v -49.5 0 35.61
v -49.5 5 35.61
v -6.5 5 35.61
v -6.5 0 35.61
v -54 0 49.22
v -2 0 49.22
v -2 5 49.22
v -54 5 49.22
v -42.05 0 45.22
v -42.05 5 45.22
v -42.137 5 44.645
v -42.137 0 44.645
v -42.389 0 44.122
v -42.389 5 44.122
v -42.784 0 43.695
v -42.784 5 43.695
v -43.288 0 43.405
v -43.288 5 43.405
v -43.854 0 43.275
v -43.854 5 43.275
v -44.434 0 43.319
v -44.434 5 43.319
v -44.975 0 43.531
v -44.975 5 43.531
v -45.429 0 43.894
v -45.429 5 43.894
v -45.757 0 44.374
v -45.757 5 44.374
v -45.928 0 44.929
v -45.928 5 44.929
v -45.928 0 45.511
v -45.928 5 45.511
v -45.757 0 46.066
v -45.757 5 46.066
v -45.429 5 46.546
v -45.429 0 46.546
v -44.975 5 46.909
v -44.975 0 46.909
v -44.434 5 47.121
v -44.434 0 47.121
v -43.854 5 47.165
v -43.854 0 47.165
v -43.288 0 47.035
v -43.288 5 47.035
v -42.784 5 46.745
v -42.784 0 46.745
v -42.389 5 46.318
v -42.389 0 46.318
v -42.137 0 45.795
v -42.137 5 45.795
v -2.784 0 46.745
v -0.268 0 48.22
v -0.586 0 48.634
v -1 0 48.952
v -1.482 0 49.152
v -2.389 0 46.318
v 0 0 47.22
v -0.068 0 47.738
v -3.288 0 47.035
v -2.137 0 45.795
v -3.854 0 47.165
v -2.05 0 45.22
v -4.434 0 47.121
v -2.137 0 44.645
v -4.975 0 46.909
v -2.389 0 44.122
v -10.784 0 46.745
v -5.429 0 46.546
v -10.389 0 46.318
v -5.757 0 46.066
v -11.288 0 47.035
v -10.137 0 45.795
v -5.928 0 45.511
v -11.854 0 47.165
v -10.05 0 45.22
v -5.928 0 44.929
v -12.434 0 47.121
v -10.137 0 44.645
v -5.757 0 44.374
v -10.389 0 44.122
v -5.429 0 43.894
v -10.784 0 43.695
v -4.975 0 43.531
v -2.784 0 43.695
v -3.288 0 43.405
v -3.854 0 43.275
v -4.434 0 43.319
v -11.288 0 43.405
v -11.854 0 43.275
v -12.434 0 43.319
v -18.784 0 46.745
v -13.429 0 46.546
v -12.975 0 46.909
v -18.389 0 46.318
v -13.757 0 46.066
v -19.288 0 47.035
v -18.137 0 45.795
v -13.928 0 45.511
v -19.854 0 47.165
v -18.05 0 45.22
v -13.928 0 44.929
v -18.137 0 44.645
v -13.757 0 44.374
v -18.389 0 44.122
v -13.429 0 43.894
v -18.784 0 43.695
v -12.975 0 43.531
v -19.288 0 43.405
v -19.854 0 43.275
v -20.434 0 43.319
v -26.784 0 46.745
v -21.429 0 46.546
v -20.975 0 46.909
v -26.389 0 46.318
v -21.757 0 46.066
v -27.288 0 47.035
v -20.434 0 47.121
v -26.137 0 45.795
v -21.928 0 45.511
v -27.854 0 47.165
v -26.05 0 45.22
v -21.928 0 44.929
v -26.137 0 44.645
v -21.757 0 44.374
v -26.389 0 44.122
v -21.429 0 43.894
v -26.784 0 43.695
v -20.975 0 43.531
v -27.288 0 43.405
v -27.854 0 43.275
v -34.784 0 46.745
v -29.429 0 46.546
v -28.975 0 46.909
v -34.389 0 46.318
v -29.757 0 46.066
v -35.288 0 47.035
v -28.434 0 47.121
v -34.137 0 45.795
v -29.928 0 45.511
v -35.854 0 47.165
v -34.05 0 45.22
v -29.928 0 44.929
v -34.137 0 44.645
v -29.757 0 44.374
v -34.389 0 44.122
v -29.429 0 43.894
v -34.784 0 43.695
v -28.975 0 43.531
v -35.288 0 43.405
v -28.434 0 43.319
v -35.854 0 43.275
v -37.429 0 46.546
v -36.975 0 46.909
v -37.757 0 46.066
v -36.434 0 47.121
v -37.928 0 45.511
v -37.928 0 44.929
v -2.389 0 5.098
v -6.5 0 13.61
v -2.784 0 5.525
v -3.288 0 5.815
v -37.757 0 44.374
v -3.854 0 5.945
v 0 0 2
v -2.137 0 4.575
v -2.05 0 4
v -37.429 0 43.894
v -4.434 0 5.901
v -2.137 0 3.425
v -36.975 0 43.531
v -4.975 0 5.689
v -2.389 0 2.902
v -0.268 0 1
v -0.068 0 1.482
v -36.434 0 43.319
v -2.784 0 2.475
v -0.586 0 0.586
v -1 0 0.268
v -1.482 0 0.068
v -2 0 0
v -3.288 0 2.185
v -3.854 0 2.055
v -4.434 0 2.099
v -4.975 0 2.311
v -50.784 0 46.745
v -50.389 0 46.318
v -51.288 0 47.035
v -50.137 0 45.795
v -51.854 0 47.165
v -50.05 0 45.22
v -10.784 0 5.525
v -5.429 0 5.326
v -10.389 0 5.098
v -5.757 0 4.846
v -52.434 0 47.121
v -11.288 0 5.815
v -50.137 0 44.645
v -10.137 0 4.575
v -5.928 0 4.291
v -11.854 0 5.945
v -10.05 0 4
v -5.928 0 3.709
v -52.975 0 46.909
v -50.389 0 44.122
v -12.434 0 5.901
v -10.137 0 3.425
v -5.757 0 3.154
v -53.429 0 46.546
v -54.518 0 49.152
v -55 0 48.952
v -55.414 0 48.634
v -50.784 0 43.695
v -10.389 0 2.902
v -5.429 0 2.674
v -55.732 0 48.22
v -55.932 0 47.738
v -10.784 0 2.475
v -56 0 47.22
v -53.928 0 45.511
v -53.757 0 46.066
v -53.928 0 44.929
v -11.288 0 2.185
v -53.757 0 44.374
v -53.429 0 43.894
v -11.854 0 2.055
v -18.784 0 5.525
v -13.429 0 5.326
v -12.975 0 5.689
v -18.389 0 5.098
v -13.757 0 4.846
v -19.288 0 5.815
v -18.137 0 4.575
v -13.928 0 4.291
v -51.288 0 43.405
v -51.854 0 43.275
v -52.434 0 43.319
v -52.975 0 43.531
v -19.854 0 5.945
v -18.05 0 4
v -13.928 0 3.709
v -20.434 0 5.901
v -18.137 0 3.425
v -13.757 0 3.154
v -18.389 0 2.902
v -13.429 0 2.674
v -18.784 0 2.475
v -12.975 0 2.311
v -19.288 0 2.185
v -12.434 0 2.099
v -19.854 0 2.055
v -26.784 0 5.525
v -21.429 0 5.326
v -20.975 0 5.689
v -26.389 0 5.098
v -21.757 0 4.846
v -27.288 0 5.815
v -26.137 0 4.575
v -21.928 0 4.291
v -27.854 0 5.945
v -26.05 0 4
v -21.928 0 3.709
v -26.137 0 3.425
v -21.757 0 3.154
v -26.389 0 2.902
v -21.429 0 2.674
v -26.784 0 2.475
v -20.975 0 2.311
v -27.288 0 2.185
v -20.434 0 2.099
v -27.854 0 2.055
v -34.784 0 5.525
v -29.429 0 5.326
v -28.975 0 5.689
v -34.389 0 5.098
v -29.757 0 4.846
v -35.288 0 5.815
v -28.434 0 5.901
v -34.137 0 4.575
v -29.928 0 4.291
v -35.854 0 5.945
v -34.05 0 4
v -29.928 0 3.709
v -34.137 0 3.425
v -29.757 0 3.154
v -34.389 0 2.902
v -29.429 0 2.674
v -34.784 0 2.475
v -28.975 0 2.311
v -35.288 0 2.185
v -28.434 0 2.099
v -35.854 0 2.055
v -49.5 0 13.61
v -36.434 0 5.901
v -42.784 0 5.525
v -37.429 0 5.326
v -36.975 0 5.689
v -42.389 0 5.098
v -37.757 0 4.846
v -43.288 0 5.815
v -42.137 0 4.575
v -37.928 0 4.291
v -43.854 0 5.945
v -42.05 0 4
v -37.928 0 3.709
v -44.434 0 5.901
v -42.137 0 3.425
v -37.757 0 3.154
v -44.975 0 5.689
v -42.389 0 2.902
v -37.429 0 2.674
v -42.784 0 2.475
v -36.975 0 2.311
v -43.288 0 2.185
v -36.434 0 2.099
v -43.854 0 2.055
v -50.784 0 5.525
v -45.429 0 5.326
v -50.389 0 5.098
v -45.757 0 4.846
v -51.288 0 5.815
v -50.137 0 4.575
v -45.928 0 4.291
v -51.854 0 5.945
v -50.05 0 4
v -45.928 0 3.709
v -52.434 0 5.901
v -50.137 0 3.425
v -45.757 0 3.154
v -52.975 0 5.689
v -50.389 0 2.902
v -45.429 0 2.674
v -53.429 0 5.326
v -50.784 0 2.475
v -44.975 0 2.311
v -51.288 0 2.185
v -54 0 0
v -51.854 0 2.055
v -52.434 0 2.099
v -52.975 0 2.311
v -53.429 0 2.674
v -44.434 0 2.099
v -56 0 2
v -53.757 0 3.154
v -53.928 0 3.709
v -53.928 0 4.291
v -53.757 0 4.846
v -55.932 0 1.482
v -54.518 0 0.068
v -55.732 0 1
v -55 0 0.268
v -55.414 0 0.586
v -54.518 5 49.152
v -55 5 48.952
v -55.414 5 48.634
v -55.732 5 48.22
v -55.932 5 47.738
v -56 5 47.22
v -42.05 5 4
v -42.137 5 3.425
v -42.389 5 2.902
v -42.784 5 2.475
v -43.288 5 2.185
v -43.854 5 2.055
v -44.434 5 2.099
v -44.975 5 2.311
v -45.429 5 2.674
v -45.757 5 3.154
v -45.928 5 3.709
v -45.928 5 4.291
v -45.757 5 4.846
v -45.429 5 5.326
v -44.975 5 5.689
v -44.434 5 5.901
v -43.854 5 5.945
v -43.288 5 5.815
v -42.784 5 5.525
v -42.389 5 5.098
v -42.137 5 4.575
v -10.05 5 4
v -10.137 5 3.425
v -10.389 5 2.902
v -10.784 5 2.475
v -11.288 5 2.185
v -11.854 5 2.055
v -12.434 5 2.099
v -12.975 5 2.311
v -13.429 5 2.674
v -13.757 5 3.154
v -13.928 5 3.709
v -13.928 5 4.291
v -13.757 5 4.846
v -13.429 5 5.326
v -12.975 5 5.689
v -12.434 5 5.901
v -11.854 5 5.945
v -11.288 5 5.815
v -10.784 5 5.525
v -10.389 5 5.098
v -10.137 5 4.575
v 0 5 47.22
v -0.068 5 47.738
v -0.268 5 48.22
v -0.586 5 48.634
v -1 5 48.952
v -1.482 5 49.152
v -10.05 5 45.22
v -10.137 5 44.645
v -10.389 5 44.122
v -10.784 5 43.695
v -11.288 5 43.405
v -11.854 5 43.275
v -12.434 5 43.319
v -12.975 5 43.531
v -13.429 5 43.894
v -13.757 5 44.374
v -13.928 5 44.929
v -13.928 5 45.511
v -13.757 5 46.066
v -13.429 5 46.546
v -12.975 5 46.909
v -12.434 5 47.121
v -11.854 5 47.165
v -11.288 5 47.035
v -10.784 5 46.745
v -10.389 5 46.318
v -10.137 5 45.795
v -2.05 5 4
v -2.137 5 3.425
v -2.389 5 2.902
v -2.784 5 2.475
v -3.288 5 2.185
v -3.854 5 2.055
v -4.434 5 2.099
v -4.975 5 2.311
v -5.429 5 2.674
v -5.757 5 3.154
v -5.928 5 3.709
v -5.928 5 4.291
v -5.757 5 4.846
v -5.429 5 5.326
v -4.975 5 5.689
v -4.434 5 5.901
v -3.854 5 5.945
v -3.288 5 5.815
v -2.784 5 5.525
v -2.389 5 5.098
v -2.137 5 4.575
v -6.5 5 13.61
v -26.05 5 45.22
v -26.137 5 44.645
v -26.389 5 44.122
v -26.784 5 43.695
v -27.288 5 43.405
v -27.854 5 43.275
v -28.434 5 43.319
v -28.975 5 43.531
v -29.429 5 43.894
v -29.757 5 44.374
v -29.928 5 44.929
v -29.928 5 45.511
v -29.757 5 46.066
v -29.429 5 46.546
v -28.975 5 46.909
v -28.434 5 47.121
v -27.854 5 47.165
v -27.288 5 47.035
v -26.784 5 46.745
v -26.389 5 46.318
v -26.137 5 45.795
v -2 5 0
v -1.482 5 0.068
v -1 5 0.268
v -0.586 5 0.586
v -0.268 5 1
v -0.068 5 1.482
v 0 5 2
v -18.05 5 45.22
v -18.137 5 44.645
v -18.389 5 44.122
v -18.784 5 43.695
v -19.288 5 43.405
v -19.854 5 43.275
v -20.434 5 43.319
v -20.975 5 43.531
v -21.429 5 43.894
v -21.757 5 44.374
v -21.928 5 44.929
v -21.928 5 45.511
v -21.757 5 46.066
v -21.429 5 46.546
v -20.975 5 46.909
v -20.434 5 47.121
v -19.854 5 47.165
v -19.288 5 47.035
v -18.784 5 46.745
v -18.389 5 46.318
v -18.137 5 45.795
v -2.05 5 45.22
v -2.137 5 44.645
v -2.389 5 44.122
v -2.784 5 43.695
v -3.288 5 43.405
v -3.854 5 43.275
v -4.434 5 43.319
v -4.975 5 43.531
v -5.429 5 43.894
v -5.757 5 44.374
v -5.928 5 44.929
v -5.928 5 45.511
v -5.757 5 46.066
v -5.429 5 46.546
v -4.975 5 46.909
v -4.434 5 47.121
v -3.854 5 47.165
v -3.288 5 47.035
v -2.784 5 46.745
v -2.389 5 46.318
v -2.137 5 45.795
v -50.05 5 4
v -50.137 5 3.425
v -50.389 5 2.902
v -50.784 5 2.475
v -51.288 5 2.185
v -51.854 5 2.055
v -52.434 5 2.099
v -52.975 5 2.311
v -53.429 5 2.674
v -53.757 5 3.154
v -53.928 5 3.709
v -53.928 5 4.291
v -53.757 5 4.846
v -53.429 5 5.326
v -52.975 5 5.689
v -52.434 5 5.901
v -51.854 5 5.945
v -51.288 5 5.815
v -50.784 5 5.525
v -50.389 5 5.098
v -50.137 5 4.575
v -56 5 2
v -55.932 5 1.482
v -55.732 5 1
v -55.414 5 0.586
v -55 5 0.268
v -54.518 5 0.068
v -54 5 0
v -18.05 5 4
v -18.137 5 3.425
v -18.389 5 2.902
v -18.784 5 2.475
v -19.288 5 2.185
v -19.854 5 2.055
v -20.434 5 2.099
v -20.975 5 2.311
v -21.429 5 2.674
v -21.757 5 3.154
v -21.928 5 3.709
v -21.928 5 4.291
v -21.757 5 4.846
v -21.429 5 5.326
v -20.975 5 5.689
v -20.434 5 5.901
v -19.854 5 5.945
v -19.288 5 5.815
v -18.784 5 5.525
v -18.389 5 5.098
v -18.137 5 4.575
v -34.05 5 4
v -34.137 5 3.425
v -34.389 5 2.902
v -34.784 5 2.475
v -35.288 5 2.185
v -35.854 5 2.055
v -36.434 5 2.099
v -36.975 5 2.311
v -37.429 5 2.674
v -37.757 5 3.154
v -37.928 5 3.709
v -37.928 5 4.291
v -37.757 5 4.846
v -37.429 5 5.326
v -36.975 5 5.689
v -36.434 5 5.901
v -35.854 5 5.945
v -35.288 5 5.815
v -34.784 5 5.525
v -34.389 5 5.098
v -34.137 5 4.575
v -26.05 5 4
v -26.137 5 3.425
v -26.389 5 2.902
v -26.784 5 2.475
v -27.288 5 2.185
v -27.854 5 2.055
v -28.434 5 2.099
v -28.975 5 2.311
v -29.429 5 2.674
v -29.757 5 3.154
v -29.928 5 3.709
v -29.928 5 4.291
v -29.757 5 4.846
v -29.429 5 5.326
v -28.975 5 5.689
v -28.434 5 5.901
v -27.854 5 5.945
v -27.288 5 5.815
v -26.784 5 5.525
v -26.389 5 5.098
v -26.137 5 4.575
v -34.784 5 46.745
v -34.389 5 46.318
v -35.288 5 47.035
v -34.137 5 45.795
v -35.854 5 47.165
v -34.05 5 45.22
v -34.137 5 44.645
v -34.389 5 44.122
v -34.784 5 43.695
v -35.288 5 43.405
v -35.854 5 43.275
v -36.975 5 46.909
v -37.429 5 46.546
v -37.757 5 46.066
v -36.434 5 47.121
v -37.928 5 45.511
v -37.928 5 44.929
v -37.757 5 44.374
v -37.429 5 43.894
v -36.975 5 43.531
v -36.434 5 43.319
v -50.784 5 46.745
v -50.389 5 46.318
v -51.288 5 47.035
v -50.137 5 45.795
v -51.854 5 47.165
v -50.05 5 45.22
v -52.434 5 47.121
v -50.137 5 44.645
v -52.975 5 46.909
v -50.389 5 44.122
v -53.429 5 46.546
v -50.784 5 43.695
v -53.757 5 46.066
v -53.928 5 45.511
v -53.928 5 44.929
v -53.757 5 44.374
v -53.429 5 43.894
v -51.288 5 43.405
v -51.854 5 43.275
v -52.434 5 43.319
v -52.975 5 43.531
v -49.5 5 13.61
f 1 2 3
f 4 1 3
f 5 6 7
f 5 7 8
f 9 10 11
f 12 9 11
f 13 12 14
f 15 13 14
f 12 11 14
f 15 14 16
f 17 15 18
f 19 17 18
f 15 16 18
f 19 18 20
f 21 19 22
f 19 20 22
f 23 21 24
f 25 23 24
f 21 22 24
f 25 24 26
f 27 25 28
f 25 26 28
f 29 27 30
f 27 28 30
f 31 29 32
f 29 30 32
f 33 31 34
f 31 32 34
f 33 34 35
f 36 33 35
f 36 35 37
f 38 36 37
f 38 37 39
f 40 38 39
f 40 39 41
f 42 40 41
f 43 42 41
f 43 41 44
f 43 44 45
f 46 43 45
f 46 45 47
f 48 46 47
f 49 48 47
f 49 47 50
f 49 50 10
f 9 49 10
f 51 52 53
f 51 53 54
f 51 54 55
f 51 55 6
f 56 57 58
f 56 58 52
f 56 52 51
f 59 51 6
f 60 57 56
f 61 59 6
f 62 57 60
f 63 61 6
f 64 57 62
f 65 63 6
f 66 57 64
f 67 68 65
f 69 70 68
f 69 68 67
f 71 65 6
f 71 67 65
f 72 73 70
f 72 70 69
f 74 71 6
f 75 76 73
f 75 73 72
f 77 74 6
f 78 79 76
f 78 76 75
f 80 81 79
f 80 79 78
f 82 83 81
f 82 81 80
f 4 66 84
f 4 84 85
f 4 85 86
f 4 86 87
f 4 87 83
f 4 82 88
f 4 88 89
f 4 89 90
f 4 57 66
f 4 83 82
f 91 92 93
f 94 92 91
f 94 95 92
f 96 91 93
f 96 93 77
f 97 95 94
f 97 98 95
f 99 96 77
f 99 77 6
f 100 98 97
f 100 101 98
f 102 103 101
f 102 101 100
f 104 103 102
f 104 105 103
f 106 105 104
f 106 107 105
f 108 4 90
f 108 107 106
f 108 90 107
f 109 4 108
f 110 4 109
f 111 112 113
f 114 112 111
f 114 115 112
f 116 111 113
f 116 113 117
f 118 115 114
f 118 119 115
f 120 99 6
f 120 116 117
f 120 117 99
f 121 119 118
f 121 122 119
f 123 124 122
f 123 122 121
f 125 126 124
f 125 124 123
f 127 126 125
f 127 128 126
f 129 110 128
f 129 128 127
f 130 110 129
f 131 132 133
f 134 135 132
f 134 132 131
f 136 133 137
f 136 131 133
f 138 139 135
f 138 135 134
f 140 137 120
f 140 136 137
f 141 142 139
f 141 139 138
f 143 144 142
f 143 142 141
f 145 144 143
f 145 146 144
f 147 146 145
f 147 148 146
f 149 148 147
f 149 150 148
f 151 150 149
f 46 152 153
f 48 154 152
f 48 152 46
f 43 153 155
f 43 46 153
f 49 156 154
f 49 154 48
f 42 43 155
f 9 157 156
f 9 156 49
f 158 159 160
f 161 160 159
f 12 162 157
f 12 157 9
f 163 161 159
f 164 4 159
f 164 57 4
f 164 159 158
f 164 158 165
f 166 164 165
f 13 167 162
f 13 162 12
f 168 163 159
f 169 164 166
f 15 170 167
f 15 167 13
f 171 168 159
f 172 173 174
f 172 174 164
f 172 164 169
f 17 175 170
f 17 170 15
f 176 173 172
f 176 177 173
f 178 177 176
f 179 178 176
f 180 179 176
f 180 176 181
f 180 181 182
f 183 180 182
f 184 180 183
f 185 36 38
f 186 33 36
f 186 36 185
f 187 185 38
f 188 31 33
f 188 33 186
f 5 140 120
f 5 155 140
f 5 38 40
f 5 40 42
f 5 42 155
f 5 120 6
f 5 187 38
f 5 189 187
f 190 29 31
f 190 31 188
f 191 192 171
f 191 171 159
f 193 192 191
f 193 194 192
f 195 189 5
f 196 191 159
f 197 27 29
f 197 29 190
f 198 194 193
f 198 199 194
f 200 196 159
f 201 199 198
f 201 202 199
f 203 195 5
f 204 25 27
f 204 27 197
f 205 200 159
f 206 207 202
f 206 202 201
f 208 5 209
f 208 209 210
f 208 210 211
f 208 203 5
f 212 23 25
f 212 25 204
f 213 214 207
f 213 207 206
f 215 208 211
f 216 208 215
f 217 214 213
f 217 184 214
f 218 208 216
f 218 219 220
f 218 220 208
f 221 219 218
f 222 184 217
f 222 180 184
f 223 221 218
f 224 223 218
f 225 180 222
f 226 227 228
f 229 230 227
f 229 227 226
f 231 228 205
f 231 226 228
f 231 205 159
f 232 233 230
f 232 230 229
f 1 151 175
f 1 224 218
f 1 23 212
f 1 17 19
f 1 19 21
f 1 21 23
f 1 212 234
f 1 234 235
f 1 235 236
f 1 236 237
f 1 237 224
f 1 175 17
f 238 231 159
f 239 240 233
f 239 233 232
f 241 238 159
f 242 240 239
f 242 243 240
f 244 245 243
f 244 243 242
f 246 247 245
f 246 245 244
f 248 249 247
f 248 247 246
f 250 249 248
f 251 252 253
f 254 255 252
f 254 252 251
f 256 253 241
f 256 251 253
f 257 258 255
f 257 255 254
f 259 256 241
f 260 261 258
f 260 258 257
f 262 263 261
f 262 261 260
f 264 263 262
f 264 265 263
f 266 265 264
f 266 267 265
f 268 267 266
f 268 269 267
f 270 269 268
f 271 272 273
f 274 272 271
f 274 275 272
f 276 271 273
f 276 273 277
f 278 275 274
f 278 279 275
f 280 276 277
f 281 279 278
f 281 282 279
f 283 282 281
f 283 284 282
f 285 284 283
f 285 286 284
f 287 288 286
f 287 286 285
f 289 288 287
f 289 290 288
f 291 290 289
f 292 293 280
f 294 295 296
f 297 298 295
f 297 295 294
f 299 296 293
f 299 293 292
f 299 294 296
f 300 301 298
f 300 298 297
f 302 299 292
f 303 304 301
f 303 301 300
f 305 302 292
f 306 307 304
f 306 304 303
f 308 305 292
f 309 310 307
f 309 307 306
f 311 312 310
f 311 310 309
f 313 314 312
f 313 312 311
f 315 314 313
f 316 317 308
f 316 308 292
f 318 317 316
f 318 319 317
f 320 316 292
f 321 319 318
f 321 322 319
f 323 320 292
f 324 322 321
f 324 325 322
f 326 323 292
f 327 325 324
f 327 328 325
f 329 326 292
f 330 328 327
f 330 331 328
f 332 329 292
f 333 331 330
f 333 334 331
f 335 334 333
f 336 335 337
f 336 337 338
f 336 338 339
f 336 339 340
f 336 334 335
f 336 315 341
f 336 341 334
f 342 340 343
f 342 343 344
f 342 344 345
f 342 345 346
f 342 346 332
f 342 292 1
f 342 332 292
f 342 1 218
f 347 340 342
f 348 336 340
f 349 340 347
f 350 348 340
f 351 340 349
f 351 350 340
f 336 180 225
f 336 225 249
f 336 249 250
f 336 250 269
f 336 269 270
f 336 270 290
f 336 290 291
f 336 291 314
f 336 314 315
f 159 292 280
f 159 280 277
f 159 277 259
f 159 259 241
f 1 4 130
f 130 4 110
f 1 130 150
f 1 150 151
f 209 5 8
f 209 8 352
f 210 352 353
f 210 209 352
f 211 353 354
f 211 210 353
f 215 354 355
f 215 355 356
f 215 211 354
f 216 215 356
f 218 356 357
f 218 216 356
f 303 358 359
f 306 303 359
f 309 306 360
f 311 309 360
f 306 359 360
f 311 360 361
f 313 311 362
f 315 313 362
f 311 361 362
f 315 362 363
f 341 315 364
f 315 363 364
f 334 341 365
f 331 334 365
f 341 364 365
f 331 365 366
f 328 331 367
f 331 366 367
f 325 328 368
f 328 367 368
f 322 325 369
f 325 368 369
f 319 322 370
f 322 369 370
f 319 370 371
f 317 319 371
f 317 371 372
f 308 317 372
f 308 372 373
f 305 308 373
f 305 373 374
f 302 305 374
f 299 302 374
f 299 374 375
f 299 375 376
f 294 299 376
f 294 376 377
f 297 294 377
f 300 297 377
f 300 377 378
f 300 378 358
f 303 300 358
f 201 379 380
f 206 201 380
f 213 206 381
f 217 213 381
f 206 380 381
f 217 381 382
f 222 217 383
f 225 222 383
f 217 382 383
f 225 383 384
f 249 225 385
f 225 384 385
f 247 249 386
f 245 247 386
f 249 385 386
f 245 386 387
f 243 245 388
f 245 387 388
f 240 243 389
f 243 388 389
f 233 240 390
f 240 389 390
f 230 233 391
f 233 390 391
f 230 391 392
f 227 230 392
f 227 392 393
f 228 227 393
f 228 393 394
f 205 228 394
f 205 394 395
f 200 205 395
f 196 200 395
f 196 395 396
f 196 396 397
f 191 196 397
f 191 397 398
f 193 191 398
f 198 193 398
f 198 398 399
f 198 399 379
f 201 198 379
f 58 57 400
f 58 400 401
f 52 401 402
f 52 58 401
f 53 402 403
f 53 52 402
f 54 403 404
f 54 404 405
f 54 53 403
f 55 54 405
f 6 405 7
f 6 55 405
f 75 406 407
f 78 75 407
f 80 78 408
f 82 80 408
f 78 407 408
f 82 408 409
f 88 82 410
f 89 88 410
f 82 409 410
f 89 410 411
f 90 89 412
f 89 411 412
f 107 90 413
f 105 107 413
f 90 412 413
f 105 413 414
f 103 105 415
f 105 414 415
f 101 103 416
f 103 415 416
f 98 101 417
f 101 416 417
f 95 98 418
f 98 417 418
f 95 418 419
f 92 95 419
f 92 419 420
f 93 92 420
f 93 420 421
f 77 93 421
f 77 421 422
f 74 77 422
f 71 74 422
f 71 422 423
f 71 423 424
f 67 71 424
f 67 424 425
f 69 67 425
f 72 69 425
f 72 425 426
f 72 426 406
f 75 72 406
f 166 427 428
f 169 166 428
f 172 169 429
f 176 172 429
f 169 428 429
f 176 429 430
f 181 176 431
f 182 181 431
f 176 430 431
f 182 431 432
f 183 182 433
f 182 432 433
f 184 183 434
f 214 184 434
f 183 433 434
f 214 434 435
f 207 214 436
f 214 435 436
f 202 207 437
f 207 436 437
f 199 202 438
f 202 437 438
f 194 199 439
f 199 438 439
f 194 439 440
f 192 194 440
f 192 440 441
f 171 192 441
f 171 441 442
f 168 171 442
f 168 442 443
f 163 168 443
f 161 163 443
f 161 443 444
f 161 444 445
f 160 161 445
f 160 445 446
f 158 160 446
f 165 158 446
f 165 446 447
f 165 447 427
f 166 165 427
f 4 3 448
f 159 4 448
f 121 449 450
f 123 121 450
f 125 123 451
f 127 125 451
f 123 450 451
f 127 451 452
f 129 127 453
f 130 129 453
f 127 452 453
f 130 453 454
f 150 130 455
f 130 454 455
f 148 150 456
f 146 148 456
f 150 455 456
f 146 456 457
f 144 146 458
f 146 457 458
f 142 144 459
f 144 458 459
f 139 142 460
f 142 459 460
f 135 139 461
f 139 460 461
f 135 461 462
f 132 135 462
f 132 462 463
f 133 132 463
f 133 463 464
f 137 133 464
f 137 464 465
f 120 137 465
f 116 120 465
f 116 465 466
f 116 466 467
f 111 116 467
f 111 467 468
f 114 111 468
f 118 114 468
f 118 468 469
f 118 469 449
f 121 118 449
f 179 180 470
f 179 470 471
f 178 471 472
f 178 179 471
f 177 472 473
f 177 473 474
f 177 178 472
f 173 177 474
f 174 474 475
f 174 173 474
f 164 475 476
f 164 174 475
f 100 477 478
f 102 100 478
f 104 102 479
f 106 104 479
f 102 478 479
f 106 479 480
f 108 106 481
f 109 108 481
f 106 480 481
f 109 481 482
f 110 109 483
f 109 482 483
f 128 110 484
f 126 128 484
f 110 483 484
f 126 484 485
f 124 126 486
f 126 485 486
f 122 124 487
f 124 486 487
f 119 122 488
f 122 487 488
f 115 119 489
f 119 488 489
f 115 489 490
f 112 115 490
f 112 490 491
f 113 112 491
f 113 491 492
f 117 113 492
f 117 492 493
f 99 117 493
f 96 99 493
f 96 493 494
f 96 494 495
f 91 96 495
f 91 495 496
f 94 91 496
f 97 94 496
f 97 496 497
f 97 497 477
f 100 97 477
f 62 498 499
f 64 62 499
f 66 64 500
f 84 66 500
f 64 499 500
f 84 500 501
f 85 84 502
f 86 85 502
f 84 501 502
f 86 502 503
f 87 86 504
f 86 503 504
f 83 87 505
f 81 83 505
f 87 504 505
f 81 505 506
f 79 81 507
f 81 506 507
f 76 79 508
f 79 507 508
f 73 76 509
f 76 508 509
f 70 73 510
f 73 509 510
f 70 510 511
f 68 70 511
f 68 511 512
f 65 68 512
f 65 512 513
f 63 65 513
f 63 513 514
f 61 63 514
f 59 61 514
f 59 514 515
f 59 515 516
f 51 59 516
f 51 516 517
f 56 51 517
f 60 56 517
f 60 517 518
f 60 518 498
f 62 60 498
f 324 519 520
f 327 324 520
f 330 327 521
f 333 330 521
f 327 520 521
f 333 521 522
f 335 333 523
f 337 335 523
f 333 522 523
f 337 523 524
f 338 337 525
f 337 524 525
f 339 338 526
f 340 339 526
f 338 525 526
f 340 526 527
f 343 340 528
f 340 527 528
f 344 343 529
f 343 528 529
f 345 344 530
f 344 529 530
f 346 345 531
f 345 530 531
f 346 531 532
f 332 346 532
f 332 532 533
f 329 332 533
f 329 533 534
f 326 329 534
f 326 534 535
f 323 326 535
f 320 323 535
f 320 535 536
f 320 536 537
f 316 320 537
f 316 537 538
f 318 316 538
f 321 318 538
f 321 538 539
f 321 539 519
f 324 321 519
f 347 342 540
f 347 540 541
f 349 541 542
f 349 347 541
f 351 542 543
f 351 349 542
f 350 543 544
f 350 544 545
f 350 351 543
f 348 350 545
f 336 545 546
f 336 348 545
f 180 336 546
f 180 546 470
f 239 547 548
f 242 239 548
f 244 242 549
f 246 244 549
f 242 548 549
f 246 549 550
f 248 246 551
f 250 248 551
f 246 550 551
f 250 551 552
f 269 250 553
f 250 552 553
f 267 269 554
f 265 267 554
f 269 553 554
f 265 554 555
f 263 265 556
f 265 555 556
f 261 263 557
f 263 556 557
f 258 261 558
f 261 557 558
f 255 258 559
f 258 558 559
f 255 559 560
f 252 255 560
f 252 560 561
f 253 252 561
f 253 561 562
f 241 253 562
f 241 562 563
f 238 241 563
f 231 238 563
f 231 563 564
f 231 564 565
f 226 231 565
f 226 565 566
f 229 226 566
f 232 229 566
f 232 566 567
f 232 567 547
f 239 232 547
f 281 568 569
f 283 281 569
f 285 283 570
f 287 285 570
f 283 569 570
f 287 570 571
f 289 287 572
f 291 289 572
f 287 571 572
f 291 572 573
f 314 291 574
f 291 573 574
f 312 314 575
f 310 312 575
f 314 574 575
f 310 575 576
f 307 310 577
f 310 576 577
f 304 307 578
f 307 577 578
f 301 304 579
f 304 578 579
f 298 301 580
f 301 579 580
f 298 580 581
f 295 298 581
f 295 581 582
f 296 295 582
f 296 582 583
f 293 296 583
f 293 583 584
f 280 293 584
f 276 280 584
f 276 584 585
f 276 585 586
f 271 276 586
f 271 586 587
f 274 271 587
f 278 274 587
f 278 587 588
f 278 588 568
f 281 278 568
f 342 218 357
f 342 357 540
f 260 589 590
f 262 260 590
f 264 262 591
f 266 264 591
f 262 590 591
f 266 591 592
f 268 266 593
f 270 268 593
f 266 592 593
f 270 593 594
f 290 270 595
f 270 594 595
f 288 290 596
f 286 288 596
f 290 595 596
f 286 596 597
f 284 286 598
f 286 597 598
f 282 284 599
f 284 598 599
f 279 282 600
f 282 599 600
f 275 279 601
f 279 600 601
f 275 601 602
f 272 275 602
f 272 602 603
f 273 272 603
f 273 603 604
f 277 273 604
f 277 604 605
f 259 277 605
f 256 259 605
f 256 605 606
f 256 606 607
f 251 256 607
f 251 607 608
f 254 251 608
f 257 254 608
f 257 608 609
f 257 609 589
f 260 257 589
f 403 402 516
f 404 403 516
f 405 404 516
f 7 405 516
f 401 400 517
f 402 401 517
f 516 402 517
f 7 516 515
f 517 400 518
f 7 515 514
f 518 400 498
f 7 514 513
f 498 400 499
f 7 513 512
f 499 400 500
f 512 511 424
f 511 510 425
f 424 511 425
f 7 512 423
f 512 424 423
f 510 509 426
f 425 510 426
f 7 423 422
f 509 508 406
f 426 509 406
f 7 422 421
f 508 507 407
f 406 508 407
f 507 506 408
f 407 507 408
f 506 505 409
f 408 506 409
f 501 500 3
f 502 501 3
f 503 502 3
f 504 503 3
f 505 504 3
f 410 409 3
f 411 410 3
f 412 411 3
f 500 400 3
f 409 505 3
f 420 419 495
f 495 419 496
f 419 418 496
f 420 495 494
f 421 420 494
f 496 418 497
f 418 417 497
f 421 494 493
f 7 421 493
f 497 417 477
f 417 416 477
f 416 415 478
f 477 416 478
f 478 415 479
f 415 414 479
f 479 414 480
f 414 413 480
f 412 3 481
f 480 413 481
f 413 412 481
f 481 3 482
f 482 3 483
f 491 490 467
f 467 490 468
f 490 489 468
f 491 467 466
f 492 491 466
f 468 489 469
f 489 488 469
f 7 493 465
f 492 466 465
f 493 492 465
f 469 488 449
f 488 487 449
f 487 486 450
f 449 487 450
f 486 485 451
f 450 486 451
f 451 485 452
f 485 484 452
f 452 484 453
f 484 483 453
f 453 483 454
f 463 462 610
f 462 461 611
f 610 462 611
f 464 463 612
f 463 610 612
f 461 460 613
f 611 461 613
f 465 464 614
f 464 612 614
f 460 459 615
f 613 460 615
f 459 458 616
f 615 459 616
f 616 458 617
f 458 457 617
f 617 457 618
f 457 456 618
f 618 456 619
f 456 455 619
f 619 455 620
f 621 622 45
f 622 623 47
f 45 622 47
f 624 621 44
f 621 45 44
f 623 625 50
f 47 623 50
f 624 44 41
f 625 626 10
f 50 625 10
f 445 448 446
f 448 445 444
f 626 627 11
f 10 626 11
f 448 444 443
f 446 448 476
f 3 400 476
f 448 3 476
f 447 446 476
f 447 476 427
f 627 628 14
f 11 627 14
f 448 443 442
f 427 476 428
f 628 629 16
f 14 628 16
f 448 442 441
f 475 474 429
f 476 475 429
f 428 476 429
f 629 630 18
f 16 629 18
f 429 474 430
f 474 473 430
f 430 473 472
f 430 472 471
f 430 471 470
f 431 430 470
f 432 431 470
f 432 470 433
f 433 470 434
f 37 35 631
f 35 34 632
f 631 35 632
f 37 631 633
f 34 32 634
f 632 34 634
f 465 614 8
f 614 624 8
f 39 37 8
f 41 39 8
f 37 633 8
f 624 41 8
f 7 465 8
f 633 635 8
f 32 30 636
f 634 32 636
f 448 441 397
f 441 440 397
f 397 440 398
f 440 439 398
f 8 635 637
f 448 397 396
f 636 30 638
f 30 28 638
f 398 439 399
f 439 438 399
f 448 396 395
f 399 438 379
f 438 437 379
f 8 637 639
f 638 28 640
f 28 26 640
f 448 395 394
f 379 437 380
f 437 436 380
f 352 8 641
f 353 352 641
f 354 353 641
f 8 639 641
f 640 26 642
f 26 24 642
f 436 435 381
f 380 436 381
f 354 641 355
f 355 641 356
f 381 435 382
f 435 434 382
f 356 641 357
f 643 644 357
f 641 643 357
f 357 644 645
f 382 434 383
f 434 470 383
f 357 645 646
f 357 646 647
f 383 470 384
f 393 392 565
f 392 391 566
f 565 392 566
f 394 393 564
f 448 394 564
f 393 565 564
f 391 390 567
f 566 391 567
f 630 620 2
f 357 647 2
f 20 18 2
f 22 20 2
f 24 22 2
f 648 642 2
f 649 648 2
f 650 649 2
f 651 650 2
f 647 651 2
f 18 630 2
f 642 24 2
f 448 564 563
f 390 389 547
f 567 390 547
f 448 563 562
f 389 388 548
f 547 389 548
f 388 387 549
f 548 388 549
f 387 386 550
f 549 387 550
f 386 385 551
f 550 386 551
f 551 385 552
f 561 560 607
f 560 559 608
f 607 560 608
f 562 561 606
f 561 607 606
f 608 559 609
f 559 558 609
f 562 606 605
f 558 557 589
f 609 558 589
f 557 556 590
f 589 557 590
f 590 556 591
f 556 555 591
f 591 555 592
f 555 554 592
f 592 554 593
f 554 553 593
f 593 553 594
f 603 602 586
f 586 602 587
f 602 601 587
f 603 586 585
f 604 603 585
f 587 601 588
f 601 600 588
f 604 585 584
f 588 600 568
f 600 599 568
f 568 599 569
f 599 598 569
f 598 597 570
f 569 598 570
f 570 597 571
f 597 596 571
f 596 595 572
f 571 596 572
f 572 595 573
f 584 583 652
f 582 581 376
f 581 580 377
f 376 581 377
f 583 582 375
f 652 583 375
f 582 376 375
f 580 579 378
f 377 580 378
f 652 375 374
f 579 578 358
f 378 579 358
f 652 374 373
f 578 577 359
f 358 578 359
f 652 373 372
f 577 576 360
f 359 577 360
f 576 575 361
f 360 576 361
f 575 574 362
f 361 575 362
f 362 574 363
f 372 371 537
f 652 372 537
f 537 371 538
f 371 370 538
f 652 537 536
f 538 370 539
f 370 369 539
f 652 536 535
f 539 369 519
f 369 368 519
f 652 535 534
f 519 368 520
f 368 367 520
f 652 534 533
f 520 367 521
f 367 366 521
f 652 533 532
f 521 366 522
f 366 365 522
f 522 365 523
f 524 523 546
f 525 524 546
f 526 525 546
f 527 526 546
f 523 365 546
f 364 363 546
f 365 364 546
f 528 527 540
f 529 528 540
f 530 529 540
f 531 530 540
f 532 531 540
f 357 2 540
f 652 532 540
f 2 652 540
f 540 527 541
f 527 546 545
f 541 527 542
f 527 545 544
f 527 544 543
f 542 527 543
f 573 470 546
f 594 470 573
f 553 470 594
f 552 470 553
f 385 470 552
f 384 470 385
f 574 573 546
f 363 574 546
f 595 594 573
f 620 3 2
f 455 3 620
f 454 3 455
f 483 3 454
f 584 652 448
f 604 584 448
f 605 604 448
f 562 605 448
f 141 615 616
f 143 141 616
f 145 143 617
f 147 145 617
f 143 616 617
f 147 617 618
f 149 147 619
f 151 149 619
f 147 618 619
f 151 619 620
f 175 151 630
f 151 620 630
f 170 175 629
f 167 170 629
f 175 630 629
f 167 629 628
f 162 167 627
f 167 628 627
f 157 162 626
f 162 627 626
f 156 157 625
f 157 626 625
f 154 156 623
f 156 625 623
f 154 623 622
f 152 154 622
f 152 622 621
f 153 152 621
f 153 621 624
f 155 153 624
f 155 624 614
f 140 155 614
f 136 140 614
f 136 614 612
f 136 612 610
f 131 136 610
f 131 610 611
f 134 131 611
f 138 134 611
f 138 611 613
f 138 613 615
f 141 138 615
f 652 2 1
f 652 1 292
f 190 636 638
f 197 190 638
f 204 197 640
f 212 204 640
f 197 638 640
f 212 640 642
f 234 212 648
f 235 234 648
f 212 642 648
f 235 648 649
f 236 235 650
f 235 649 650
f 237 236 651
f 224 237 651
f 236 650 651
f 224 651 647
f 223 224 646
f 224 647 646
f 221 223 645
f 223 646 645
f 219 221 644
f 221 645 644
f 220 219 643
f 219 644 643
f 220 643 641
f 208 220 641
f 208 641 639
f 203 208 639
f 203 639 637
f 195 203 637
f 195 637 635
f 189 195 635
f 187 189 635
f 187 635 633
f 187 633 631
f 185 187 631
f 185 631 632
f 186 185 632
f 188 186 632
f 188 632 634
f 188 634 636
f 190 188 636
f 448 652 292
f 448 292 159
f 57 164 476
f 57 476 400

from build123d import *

# Parameters (mm, degrees)
BOSS_EXTRUDE1_DEPTH = 5
SKETCH2_R           = 1.95
SKETCH2_W           = 43
SKETCH2_H           = 22
CUT_EXTRUDE1_DEPTH  = 6


with BuildPart() as part:
    # Sketch1 → Boss-Extrude1 (new body)
    with BuildSketch(Plane(origin=(0, 0, 0), x_dir=(1, 0, 0), z_dir=(0, 1, 0))):
        with BuildLine():
            Line((-54, 0), (-2, 0))
            ThreePointArc((-2, 0), (-0.585786438, -0.585786438), (0, -2))
            Line((0, -2), (0, -47.22))
            ThreePointArc((0, -47.22), (-0.585786438, -48.634213562), (-2, -49.22))
            Line((-2, -49.22), (-54, -49.22))
            ThreePointArc((-54, -49.22), (-55.414213562, -48.634213562), (-56, -47.22))
            Line((-56, -47.22), (-56, -2))
            ThreePointArc((-56, -2), (-55.414213562, -0.585786438), (-54, 0))
        make_face()
    extrude(amount=BOSS_EXTRUDE1_DEPTH)

    # Sketch2 → Cut-Extrude1 (cut, through all)
    with BuildSketch(Plane(origin=(0, 5, 0), x_dir=(1, 0, 0), z_dir=(0, 1, 0))):
        with Locations((-4, -4)):
            Circle(SKETCH2_R)
        with Locations((-12, -4)):
            Circle(SKETCH2_R)
        with Locations((18, -4)):
            Circle(SKETCH2_R)
        with Locations((-68, -4)):
            Circle(SKETCH2_R)
        with Locations((-60, -4)):
            Circle(SKETCH2_R)
        with Locations((-52, -4)):
            Circle(SKETCH2_R)
        with Locations((-44, -4)):
            Circle(SKETCH2_R)
        with Locations((-36, -4)):
            Circle(SKETCH2_R)
        with Locations((-28, -4)):
            Circle(SKETCH2_R)
        with Locations((-20, -4)):
            Circle(SKETCH2_R)
        with Locations((-4, -45.22)):
            Circle(SKETCH2_R)
        with Locations((-12, -45.22)):
            Circle(SKETCH2_R)
        with Locations((18, -45.22)):
            Circle(SKETCH2_R)
        with Locations((-68, -45.22)):
            Circle(SKETCH2_R)
        with Locations((-60, -45.22)):
            Circle(SKETCH2_R)
        with Locations((-52, -45.22)):
            Circle(SKETCH2_R)
        with Locations((-44, -45.22)):
            Circle(SKETCH2_R)
        with Locations((-36, -45.22)):
            Circle(SKETCH2_R)
        with Locations((-28, -45.22)):
            Circle(SKETCH2_R)
        with Locations((-20, -45.22)):
            Circle(SKETCH2_R)
        with Locations((-28, -24.61)):
            Rectangle(SKETCH2_W, SKETCH2_H)
    extrude(amount=-CUT_EXTRUDE1_DEPTH, mode=Mode.SUBTRACT)


solid = part.part
